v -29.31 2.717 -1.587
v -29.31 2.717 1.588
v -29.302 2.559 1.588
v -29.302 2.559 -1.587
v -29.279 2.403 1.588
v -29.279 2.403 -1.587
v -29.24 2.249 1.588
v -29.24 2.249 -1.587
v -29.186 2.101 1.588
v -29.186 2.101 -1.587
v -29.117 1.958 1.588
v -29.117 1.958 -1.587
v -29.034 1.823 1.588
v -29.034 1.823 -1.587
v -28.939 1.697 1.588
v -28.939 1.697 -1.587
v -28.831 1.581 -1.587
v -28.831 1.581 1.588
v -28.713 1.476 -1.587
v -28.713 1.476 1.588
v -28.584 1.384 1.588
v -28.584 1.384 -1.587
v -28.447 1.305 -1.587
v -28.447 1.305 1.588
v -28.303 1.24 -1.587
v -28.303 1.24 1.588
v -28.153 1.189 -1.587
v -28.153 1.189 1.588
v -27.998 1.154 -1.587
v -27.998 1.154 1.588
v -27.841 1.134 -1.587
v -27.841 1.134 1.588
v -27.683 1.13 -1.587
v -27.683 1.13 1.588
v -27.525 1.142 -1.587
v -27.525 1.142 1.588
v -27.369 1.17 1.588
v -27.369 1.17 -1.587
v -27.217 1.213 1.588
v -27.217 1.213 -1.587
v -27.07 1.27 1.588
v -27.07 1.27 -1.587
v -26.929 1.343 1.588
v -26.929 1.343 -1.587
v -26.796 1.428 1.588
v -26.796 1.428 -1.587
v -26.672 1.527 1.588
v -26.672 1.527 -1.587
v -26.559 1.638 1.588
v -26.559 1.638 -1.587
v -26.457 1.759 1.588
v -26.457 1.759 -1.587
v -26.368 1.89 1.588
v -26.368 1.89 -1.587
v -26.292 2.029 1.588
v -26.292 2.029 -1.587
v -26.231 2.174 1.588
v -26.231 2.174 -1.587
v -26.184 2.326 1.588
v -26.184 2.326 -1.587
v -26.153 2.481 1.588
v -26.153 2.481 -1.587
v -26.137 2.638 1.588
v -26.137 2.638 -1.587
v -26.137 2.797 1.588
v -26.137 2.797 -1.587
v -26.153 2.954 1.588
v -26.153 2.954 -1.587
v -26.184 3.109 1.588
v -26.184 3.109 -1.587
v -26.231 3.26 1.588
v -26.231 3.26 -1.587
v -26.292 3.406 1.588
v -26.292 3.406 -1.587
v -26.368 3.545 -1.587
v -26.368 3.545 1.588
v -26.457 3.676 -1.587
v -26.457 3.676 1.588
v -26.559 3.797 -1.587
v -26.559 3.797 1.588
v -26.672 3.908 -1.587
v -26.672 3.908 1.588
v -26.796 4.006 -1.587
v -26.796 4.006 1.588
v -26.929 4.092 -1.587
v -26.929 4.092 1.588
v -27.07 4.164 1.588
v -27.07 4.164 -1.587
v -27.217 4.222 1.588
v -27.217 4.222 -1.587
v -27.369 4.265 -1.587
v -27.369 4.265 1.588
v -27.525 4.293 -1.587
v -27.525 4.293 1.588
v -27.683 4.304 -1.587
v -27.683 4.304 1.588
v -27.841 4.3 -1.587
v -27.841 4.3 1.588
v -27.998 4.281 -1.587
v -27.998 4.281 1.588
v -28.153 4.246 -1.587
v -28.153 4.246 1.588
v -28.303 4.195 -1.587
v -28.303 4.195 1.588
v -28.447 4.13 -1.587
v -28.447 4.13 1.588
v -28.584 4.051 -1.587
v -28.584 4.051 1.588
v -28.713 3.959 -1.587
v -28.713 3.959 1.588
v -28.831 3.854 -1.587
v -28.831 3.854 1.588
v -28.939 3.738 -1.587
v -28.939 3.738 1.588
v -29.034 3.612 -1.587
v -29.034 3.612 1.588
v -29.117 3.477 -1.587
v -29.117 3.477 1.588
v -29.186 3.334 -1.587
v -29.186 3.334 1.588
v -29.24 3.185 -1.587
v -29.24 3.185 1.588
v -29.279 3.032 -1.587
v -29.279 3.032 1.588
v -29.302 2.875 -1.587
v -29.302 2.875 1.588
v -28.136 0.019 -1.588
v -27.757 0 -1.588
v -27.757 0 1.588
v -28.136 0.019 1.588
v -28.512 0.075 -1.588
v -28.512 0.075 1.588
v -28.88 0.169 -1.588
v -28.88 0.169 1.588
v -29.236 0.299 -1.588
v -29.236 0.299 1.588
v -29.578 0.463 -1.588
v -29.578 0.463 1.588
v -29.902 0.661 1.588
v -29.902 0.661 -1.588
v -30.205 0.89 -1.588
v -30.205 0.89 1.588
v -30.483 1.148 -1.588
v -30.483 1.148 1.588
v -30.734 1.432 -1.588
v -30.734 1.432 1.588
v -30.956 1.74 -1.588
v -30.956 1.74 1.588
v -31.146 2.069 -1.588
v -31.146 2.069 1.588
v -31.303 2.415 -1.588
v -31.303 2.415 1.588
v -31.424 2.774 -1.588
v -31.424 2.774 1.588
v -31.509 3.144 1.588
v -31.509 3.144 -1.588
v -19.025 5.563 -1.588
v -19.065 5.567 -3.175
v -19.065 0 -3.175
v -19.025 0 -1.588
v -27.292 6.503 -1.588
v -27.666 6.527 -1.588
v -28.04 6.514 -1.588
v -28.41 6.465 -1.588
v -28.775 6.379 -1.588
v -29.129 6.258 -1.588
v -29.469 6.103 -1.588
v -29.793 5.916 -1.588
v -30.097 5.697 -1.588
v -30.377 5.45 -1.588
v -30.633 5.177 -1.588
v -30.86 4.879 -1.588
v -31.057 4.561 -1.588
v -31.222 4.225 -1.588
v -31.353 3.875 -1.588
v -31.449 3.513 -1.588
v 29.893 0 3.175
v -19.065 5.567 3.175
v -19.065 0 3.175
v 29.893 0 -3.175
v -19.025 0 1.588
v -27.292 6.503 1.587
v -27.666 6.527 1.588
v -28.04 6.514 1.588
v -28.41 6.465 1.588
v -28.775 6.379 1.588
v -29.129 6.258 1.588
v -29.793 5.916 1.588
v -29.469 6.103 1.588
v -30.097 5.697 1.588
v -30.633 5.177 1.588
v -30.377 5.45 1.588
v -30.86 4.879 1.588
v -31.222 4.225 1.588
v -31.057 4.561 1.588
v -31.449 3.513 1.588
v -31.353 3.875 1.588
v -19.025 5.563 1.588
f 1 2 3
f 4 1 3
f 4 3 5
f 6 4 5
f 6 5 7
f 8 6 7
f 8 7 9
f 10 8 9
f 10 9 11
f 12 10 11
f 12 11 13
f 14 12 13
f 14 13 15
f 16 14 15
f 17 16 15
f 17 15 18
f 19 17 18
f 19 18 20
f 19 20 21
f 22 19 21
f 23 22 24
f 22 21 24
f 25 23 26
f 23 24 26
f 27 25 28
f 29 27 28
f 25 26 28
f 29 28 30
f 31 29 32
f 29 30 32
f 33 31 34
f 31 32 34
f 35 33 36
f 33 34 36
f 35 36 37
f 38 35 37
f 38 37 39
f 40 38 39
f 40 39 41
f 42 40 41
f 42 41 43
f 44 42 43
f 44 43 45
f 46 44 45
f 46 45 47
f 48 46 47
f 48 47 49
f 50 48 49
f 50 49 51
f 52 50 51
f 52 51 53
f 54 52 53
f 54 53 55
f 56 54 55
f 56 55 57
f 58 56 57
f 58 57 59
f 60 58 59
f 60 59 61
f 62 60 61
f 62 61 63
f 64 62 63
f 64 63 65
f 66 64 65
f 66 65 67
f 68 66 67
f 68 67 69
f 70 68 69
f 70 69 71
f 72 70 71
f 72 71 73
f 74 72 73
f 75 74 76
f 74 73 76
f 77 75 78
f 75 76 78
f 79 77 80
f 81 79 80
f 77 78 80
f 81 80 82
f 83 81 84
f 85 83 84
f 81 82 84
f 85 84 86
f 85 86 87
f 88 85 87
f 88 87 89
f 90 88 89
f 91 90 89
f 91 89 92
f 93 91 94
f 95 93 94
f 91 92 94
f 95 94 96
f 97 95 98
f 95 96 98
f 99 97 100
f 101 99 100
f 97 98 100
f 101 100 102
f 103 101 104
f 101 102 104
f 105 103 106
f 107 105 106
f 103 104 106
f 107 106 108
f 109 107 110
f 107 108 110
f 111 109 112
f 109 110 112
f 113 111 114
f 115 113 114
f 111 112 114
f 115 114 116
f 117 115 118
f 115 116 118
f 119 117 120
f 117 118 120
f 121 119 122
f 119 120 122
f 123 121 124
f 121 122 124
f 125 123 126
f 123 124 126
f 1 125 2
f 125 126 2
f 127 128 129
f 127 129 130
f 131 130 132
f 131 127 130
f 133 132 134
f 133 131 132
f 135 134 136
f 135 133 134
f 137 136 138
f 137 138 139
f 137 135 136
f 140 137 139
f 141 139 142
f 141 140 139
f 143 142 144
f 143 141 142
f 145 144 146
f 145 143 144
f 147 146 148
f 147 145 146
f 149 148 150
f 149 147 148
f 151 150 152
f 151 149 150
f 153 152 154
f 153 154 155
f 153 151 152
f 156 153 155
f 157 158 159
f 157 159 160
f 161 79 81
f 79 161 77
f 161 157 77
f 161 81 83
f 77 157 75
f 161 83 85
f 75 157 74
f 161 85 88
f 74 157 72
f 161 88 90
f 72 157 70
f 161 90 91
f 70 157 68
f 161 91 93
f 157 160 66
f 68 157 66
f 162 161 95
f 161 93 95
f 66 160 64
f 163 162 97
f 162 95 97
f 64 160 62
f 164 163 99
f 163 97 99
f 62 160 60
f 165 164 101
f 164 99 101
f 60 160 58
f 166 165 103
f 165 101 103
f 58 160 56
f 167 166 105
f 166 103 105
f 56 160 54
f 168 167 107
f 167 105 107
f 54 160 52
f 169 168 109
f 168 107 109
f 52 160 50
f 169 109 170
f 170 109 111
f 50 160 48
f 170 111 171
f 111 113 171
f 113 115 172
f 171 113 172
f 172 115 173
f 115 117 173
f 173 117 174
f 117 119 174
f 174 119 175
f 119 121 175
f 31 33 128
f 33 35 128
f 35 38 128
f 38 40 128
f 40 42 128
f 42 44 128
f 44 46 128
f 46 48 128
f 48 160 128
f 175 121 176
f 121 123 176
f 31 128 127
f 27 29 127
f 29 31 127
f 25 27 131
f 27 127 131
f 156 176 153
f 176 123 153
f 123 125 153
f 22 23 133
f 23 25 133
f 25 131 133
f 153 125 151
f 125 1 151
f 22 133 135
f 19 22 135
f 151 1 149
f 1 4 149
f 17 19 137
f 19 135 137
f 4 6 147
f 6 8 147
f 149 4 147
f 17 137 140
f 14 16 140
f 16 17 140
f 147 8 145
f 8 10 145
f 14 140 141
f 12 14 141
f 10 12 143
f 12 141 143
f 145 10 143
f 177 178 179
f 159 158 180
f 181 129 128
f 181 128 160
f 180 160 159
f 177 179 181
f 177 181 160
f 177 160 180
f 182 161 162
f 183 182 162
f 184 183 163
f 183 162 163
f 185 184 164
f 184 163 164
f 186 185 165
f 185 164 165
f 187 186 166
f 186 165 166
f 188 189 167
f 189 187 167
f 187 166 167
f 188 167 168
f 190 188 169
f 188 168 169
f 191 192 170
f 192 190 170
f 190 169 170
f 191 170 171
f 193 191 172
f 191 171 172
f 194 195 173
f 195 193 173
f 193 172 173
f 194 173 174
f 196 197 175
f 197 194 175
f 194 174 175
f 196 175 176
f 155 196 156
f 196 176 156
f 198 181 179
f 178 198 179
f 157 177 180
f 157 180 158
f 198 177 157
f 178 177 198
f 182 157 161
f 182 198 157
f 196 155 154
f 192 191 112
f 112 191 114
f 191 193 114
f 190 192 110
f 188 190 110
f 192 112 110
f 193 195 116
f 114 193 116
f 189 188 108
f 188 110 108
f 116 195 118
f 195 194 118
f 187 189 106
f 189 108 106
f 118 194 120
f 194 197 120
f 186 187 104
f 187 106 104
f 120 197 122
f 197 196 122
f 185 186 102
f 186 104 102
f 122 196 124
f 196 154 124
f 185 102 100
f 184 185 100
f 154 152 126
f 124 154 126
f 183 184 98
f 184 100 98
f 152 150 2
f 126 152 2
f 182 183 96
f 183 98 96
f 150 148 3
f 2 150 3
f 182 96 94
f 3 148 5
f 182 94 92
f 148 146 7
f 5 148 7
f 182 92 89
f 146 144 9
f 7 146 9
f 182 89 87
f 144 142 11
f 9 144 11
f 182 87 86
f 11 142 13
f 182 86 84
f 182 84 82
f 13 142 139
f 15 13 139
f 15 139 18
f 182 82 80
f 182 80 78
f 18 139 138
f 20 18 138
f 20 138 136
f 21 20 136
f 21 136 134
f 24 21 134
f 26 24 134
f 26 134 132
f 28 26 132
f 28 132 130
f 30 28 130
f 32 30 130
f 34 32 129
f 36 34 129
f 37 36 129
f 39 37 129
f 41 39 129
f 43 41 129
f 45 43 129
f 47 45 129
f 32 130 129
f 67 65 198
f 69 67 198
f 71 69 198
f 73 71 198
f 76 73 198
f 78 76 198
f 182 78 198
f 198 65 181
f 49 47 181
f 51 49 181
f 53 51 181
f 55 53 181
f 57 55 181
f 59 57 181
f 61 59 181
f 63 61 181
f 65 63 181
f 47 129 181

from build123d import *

# Parameters (mm, degrees)
F1_DEPTH    = 3.175
F3_DEPTH    = 25.4
F4_T1_DEPTH = 21.629832931
F4_T3_DEPTH = 25.208081251
F6_D        = 3.175


# Not quite as in the source:
# - a fillet or chamfer that OpenCascade refuses, or shapes differently, is made with other operations: its cross-section is extruded or revolved along the edge and cut away or added


with BuildPart() as f1:
    # F0 (on Top) → F1 (new body, symmetric)
    with BuildSketch(Plane.XY):
        Polygon((-31.6706262529, 7.0008751936), (-31.4483754337, 0), (29.8926271498, 0), align=None)
    extrude(amount=F1_DEPTH, both=True)

    # F2 (on Front) → F3 (cut)
    with BuildSketch(Plane.XZ):
        Polygon((-32.3509715194, 5.2941306494), (-32.3509715194, 1.5875), (-19.0253787046, 1.5875), (-19.1175676882, 5.2941306494), align=None)
        Polygon((-19.0253787046, -1.5875), (-32.3509715194, -1.5875), (-32.3509715194, -5.2941306494), (-19.1175676882, -5.2941306494), align=None)
    extrude(amount=-F3_DEPTH, mode=Mode.SUBTRACT)

    # F4: fillet of radius 3.81 on 2 edges, made by hand

    # F4_s2 → F4_t1 (cut)
    with BuildSketch(Plane.XY.offset(-10.8149164655)):
        with BuildLine():
            ThreePointArc((-27.7574088475, 0), (-30.4083993967, 1.0735151913), (-31.5654904043, 3.6891080797))
            Line((-31.5654904043, 3.6891080797), (-31.4483754337, 0))
            Line((-31.4483754337, 0), (-27.7574088475, 0))
        make_face()
    extrude(amount=F4_T1_DEPTH, mode=Mode.SUBTRACT)

    # F4_s4 → F4_t3 (cut)
    with BuildSketch(Plane.XY.offset(-12.6040406255)):
        with BuildLine():
            ThreePointArc((-27.2922295058, 6.5029708841), (-30.3048140162, 5.5189587428), (-31.5308036019, 2.5964777998))
            Line((-31.5308036019, 2.5964777998), (-31.6706262529, 7.0008751936))
            Line((-31.6706262529, 7.0008751936), (-27.2922295058, 6.5029708841))
        make_face()
    extrude(amount=F4_T3_DEPTH, mode=Mode.SUBTRACT)

    # F6 (through all)
    with Locations(Plane(origin=(0, 0, -3.175), x_dir=(1, 0, 0), z_dir=(0, 0, -1))):
        with Locations((-27.722722045, -2.71736972)):
            Hole(F6_D / 2)


solid = f1.part
